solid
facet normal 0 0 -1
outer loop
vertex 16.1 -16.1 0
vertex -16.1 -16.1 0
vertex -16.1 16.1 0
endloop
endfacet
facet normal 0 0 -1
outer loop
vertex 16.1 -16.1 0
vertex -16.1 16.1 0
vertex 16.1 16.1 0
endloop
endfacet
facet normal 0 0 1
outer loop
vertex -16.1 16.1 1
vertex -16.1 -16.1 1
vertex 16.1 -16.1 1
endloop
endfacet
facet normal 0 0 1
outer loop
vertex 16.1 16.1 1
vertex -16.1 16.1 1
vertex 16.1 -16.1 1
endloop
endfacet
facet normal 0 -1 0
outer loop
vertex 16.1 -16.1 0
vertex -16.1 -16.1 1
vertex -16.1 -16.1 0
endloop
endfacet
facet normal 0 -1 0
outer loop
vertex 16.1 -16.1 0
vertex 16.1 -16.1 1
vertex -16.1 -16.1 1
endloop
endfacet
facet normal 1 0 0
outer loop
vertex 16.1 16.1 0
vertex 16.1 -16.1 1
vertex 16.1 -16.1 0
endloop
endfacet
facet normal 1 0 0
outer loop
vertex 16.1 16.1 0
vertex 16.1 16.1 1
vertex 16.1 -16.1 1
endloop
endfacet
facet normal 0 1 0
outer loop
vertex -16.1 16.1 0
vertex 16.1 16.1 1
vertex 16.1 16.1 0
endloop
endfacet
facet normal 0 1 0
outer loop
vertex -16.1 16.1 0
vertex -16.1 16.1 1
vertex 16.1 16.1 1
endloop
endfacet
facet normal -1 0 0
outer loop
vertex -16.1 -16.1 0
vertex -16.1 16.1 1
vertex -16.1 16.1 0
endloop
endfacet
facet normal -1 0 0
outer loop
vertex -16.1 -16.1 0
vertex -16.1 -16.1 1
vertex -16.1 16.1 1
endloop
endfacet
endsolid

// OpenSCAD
// file: ../diffuser.scad
// Swappable diffuser panel. Thickness is the STL knob; the diffusing structure
// (gyroid/grid, density, top/bottom solid layers = 0) is set in the slicer.

module diffuser_panel(t) {
    linear_extrude(t) square([panel_side, panel_side], center = true);
}
// file: ../config.scad
// ===== CHARGE LED sign — global config =====
// Edit this file; then run ./build.sh to regenerate every STL.

$fn = 72;

// ---- calibrated collar (press-fit for 12mm bullet pixel) ----
collar_stl    = "../../assets/bullet-collar.stl"; // path resolved from src/parts/ entry files
collar_h      = 2.0;     // Z span of the collar STL
collar_od     = 16.0;    // collar outer diameter
collar_cx     = 43.0;    // STL native X center (Y center is 0)
pixel_through = 12.3;    // clearance hole through the plate (just over bore Ø12.19)
dome_clear    = 9.0;     // lit dome protrusion above the rear plate — MEASURE on your pixel

// ---- shell ----
plate_t    = 2.0;        // rear plate thickness (== collar_h, so the collar sits flush)
wall_t     = 2.5;        // chimney wall thickness
cell_inner = 30;         // square interior of each test cell
lip_t      = 1.2;        // outer locating-lip thickness
lip_h      = 3.5;        // lip height above the seat (captures the panel)

// ---- diffuser panels ----
panel_clear  = 0.4;      // clearance so a panel drops into the lip
panel_thicks = [1, 2, 3];

// ---- coupon depth ladder ----
led_gaps = [20, 35, 50]; // clear LED-tip -> panel distance, per cell (mm)

// ---- derived ----
cell_pitch = cell_inner + 2 * wall_t;      // outer cell footprint (35)
n_cells    = len(led_gaps);
plate_w    = n_cells * cell_pitch;
plate_d    = cell_pitch;
panel_side = cell_pitch - 2 * lip_t - panel_clear;
function cell_x(i)     = i * cell_pitch + cell_pitch / 2;
function chimney_H(i)  = plate_t + dome_clear + led_gaps[i];
// main file
// Build target: 1mm diffuser panel.
include <../config.scad>
include <../diffuser.scad>
diffuser_panel(1);
